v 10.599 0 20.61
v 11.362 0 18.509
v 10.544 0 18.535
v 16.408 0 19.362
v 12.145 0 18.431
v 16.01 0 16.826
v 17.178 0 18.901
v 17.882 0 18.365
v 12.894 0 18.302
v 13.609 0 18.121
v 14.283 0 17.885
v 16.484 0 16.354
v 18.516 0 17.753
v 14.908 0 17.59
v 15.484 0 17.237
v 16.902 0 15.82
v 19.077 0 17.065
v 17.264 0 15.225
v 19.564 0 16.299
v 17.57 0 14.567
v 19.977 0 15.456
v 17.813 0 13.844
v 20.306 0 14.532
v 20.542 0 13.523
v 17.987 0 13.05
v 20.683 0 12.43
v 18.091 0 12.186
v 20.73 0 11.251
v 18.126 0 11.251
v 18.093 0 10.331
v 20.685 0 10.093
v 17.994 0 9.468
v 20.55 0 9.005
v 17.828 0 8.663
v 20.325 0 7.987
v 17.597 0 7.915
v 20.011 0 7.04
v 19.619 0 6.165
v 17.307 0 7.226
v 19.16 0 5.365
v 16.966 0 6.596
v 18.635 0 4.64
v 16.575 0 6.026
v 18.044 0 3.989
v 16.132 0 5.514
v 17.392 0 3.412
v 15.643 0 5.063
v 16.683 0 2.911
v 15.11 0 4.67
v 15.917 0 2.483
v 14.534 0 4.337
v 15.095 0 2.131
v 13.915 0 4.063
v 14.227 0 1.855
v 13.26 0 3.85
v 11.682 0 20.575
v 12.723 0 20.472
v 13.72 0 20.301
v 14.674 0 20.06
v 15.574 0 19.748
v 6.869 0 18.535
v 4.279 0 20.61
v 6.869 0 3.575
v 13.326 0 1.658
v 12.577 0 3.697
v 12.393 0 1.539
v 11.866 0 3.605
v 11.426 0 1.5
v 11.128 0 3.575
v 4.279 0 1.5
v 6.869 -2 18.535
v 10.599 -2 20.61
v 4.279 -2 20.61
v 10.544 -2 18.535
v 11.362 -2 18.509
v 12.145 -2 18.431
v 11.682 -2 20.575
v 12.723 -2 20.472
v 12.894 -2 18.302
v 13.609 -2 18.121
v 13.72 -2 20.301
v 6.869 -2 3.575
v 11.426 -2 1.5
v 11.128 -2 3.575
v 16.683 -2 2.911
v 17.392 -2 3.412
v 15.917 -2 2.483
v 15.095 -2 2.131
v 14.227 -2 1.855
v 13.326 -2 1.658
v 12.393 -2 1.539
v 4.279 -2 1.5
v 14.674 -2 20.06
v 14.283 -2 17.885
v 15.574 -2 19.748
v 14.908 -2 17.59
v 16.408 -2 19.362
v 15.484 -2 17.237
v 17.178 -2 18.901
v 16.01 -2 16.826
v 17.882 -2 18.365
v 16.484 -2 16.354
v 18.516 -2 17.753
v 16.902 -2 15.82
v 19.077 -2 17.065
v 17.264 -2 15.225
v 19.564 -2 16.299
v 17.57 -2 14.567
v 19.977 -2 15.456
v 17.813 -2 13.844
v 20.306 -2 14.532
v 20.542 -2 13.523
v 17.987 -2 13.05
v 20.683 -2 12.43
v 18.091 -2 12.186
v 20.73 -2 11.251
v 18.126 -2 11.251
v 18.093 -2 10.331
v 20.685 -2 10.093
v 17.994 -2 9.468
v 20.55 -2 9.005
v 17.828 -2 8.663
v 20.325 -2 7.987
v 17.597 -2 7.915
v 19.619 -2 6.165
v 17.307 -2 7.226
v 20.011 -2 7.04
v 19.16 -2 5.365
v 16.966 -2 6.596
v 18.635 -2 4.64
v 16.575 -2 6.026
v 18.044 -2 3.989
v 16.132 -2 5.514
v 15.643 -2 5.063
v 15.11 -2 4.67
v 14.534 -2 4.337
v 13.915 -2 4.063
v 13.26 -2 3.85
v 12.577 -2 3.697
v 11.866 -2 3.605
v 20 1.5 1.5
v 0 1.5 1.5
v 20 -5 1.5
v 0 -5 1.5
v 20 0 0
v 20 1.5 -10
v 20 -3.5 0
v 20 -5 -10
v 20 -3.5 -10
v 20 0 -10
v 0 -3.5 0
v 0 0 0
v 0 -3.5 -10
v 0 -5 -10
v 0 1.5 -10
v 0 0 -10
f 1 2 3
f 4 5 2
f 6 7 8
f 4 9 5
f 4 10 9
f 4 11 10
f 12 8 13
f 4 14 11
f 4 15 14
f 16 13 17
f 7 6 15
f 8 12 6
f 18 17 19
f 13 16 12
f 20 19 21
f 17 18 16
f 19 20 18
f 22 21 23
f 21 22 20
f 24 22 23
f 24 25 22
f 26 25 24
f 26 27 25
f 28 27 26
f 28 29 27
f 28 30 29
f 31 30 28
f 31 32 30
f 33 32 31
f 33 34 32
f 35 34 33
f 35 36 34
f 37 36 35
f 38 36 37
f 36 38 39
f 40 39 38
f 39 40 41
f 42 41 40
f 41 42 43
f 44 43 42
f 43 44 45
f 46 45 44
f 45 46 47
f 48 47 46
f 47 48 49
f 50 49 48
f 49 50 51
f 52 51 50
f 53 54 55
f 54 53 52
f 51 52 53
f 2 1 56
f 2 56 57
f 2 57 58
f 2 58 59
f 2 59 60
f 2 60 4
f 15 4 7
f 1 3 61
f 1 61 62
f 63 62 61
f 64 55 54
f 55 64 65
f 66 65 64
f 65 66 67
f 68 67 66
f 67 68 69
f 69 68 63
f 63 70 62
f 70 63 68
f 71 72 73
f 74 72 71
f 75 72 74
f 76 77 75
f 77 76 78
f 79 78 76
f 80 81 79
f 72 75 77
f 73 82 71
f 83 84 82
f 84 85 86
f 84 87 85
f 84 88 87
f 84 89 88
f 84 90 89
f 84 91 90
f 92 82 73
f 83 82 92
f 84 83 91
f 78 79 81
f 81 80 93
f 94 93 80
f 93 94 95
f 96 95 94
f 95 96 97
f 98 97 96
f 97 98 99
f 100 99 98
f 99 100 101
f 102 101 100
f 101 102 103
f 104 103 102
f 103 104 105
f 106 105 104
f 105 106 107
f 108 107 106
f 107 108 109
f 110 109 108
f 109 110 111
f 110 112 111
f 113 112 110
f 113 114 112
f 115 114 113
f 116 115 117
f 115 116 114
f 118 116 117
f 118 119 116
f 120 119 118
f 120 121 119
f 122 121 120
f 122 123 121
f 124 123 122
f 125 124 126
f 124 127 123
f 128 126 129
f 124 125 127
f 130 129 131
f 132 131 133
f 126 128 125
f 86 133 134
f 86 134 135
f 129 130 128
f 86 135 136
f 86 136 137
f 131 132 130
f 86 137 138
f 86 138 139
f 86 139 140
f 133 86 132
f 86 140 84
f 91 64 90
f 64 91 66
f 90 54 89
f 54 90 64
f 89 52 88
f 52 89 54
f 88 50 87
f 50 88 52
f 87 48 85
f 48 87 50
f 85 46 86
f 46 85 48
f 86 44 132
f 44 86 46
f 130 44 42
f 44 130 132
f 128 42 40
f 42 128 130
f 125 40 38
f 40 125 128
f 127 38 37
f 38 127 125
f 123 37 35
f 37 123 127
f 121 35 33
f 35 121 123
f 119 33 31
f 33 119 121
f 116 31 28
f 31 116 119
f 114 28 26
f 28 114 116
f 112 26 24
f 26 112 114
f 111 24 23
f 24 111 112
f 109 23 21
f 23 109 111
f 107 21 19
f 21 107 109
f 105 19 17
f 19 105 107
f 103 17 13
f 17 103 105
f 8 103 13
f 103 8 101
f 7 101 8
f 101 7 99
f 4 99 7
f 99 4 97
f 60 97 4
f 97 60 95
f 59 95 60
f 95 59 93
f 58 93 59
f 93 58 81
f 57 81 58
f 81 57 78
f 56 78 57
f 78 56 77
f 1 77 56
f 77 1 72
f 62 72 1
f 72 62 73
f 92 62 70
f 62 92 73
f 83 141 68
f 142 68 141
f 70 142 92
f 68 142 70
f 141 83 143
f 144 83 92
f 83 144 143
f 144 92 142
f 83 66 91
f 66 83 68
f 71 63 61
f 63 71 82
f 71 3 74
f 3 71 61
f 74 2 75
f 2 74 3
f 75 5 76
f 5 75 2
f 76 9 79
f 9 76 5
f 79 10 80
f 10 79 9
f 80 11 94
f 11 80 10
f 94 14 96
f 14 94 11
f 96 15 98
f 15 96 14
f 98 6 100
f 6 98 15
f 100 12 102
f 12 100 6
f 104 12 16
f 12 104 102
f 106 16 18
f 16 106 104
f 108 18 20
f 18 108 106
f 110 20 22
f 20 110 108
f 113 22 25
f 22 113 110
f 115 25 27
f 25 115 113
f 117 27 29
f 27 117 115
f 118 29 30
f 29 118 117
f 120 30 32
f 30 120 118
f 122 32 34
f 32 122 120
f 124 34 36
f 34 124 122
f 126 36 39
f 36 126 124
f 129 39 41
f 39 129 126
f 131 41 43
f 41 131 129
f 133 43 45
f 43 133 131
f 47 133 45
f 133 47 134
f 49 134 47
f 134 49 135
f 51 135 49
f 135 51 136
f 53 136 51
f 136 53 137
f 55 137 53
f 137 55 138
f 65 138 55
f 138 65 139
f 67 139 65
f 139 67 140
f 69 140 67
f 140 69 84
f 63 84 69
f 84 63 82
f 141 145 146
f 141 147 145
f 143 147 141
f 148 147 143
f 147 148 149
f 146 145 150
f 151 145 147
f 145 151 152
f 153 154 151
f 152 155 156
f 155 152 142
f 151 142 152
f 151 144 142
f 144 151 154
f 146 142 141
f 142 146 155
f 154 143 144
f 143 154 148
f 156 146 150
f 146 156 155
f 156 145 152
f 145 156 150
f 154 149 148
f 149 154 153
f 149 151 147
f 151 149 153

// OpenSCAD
length=20;
thickness=1.5;
// gap


// 3.5mm gap, 10mm hooks


rotate([90, 0, 0])
translate([2, 1.5, 0])
linear_extrude(height=2)
    text("D", 20, "Arial");


translate([0, -5, 0])
cube([length, 6.5, thickness]);

translate([0, 0, -10])
cube([length, thickness, 10]);

translate([0, -3.5 -thickness, -10])
cube([length, thickness, 10]);
